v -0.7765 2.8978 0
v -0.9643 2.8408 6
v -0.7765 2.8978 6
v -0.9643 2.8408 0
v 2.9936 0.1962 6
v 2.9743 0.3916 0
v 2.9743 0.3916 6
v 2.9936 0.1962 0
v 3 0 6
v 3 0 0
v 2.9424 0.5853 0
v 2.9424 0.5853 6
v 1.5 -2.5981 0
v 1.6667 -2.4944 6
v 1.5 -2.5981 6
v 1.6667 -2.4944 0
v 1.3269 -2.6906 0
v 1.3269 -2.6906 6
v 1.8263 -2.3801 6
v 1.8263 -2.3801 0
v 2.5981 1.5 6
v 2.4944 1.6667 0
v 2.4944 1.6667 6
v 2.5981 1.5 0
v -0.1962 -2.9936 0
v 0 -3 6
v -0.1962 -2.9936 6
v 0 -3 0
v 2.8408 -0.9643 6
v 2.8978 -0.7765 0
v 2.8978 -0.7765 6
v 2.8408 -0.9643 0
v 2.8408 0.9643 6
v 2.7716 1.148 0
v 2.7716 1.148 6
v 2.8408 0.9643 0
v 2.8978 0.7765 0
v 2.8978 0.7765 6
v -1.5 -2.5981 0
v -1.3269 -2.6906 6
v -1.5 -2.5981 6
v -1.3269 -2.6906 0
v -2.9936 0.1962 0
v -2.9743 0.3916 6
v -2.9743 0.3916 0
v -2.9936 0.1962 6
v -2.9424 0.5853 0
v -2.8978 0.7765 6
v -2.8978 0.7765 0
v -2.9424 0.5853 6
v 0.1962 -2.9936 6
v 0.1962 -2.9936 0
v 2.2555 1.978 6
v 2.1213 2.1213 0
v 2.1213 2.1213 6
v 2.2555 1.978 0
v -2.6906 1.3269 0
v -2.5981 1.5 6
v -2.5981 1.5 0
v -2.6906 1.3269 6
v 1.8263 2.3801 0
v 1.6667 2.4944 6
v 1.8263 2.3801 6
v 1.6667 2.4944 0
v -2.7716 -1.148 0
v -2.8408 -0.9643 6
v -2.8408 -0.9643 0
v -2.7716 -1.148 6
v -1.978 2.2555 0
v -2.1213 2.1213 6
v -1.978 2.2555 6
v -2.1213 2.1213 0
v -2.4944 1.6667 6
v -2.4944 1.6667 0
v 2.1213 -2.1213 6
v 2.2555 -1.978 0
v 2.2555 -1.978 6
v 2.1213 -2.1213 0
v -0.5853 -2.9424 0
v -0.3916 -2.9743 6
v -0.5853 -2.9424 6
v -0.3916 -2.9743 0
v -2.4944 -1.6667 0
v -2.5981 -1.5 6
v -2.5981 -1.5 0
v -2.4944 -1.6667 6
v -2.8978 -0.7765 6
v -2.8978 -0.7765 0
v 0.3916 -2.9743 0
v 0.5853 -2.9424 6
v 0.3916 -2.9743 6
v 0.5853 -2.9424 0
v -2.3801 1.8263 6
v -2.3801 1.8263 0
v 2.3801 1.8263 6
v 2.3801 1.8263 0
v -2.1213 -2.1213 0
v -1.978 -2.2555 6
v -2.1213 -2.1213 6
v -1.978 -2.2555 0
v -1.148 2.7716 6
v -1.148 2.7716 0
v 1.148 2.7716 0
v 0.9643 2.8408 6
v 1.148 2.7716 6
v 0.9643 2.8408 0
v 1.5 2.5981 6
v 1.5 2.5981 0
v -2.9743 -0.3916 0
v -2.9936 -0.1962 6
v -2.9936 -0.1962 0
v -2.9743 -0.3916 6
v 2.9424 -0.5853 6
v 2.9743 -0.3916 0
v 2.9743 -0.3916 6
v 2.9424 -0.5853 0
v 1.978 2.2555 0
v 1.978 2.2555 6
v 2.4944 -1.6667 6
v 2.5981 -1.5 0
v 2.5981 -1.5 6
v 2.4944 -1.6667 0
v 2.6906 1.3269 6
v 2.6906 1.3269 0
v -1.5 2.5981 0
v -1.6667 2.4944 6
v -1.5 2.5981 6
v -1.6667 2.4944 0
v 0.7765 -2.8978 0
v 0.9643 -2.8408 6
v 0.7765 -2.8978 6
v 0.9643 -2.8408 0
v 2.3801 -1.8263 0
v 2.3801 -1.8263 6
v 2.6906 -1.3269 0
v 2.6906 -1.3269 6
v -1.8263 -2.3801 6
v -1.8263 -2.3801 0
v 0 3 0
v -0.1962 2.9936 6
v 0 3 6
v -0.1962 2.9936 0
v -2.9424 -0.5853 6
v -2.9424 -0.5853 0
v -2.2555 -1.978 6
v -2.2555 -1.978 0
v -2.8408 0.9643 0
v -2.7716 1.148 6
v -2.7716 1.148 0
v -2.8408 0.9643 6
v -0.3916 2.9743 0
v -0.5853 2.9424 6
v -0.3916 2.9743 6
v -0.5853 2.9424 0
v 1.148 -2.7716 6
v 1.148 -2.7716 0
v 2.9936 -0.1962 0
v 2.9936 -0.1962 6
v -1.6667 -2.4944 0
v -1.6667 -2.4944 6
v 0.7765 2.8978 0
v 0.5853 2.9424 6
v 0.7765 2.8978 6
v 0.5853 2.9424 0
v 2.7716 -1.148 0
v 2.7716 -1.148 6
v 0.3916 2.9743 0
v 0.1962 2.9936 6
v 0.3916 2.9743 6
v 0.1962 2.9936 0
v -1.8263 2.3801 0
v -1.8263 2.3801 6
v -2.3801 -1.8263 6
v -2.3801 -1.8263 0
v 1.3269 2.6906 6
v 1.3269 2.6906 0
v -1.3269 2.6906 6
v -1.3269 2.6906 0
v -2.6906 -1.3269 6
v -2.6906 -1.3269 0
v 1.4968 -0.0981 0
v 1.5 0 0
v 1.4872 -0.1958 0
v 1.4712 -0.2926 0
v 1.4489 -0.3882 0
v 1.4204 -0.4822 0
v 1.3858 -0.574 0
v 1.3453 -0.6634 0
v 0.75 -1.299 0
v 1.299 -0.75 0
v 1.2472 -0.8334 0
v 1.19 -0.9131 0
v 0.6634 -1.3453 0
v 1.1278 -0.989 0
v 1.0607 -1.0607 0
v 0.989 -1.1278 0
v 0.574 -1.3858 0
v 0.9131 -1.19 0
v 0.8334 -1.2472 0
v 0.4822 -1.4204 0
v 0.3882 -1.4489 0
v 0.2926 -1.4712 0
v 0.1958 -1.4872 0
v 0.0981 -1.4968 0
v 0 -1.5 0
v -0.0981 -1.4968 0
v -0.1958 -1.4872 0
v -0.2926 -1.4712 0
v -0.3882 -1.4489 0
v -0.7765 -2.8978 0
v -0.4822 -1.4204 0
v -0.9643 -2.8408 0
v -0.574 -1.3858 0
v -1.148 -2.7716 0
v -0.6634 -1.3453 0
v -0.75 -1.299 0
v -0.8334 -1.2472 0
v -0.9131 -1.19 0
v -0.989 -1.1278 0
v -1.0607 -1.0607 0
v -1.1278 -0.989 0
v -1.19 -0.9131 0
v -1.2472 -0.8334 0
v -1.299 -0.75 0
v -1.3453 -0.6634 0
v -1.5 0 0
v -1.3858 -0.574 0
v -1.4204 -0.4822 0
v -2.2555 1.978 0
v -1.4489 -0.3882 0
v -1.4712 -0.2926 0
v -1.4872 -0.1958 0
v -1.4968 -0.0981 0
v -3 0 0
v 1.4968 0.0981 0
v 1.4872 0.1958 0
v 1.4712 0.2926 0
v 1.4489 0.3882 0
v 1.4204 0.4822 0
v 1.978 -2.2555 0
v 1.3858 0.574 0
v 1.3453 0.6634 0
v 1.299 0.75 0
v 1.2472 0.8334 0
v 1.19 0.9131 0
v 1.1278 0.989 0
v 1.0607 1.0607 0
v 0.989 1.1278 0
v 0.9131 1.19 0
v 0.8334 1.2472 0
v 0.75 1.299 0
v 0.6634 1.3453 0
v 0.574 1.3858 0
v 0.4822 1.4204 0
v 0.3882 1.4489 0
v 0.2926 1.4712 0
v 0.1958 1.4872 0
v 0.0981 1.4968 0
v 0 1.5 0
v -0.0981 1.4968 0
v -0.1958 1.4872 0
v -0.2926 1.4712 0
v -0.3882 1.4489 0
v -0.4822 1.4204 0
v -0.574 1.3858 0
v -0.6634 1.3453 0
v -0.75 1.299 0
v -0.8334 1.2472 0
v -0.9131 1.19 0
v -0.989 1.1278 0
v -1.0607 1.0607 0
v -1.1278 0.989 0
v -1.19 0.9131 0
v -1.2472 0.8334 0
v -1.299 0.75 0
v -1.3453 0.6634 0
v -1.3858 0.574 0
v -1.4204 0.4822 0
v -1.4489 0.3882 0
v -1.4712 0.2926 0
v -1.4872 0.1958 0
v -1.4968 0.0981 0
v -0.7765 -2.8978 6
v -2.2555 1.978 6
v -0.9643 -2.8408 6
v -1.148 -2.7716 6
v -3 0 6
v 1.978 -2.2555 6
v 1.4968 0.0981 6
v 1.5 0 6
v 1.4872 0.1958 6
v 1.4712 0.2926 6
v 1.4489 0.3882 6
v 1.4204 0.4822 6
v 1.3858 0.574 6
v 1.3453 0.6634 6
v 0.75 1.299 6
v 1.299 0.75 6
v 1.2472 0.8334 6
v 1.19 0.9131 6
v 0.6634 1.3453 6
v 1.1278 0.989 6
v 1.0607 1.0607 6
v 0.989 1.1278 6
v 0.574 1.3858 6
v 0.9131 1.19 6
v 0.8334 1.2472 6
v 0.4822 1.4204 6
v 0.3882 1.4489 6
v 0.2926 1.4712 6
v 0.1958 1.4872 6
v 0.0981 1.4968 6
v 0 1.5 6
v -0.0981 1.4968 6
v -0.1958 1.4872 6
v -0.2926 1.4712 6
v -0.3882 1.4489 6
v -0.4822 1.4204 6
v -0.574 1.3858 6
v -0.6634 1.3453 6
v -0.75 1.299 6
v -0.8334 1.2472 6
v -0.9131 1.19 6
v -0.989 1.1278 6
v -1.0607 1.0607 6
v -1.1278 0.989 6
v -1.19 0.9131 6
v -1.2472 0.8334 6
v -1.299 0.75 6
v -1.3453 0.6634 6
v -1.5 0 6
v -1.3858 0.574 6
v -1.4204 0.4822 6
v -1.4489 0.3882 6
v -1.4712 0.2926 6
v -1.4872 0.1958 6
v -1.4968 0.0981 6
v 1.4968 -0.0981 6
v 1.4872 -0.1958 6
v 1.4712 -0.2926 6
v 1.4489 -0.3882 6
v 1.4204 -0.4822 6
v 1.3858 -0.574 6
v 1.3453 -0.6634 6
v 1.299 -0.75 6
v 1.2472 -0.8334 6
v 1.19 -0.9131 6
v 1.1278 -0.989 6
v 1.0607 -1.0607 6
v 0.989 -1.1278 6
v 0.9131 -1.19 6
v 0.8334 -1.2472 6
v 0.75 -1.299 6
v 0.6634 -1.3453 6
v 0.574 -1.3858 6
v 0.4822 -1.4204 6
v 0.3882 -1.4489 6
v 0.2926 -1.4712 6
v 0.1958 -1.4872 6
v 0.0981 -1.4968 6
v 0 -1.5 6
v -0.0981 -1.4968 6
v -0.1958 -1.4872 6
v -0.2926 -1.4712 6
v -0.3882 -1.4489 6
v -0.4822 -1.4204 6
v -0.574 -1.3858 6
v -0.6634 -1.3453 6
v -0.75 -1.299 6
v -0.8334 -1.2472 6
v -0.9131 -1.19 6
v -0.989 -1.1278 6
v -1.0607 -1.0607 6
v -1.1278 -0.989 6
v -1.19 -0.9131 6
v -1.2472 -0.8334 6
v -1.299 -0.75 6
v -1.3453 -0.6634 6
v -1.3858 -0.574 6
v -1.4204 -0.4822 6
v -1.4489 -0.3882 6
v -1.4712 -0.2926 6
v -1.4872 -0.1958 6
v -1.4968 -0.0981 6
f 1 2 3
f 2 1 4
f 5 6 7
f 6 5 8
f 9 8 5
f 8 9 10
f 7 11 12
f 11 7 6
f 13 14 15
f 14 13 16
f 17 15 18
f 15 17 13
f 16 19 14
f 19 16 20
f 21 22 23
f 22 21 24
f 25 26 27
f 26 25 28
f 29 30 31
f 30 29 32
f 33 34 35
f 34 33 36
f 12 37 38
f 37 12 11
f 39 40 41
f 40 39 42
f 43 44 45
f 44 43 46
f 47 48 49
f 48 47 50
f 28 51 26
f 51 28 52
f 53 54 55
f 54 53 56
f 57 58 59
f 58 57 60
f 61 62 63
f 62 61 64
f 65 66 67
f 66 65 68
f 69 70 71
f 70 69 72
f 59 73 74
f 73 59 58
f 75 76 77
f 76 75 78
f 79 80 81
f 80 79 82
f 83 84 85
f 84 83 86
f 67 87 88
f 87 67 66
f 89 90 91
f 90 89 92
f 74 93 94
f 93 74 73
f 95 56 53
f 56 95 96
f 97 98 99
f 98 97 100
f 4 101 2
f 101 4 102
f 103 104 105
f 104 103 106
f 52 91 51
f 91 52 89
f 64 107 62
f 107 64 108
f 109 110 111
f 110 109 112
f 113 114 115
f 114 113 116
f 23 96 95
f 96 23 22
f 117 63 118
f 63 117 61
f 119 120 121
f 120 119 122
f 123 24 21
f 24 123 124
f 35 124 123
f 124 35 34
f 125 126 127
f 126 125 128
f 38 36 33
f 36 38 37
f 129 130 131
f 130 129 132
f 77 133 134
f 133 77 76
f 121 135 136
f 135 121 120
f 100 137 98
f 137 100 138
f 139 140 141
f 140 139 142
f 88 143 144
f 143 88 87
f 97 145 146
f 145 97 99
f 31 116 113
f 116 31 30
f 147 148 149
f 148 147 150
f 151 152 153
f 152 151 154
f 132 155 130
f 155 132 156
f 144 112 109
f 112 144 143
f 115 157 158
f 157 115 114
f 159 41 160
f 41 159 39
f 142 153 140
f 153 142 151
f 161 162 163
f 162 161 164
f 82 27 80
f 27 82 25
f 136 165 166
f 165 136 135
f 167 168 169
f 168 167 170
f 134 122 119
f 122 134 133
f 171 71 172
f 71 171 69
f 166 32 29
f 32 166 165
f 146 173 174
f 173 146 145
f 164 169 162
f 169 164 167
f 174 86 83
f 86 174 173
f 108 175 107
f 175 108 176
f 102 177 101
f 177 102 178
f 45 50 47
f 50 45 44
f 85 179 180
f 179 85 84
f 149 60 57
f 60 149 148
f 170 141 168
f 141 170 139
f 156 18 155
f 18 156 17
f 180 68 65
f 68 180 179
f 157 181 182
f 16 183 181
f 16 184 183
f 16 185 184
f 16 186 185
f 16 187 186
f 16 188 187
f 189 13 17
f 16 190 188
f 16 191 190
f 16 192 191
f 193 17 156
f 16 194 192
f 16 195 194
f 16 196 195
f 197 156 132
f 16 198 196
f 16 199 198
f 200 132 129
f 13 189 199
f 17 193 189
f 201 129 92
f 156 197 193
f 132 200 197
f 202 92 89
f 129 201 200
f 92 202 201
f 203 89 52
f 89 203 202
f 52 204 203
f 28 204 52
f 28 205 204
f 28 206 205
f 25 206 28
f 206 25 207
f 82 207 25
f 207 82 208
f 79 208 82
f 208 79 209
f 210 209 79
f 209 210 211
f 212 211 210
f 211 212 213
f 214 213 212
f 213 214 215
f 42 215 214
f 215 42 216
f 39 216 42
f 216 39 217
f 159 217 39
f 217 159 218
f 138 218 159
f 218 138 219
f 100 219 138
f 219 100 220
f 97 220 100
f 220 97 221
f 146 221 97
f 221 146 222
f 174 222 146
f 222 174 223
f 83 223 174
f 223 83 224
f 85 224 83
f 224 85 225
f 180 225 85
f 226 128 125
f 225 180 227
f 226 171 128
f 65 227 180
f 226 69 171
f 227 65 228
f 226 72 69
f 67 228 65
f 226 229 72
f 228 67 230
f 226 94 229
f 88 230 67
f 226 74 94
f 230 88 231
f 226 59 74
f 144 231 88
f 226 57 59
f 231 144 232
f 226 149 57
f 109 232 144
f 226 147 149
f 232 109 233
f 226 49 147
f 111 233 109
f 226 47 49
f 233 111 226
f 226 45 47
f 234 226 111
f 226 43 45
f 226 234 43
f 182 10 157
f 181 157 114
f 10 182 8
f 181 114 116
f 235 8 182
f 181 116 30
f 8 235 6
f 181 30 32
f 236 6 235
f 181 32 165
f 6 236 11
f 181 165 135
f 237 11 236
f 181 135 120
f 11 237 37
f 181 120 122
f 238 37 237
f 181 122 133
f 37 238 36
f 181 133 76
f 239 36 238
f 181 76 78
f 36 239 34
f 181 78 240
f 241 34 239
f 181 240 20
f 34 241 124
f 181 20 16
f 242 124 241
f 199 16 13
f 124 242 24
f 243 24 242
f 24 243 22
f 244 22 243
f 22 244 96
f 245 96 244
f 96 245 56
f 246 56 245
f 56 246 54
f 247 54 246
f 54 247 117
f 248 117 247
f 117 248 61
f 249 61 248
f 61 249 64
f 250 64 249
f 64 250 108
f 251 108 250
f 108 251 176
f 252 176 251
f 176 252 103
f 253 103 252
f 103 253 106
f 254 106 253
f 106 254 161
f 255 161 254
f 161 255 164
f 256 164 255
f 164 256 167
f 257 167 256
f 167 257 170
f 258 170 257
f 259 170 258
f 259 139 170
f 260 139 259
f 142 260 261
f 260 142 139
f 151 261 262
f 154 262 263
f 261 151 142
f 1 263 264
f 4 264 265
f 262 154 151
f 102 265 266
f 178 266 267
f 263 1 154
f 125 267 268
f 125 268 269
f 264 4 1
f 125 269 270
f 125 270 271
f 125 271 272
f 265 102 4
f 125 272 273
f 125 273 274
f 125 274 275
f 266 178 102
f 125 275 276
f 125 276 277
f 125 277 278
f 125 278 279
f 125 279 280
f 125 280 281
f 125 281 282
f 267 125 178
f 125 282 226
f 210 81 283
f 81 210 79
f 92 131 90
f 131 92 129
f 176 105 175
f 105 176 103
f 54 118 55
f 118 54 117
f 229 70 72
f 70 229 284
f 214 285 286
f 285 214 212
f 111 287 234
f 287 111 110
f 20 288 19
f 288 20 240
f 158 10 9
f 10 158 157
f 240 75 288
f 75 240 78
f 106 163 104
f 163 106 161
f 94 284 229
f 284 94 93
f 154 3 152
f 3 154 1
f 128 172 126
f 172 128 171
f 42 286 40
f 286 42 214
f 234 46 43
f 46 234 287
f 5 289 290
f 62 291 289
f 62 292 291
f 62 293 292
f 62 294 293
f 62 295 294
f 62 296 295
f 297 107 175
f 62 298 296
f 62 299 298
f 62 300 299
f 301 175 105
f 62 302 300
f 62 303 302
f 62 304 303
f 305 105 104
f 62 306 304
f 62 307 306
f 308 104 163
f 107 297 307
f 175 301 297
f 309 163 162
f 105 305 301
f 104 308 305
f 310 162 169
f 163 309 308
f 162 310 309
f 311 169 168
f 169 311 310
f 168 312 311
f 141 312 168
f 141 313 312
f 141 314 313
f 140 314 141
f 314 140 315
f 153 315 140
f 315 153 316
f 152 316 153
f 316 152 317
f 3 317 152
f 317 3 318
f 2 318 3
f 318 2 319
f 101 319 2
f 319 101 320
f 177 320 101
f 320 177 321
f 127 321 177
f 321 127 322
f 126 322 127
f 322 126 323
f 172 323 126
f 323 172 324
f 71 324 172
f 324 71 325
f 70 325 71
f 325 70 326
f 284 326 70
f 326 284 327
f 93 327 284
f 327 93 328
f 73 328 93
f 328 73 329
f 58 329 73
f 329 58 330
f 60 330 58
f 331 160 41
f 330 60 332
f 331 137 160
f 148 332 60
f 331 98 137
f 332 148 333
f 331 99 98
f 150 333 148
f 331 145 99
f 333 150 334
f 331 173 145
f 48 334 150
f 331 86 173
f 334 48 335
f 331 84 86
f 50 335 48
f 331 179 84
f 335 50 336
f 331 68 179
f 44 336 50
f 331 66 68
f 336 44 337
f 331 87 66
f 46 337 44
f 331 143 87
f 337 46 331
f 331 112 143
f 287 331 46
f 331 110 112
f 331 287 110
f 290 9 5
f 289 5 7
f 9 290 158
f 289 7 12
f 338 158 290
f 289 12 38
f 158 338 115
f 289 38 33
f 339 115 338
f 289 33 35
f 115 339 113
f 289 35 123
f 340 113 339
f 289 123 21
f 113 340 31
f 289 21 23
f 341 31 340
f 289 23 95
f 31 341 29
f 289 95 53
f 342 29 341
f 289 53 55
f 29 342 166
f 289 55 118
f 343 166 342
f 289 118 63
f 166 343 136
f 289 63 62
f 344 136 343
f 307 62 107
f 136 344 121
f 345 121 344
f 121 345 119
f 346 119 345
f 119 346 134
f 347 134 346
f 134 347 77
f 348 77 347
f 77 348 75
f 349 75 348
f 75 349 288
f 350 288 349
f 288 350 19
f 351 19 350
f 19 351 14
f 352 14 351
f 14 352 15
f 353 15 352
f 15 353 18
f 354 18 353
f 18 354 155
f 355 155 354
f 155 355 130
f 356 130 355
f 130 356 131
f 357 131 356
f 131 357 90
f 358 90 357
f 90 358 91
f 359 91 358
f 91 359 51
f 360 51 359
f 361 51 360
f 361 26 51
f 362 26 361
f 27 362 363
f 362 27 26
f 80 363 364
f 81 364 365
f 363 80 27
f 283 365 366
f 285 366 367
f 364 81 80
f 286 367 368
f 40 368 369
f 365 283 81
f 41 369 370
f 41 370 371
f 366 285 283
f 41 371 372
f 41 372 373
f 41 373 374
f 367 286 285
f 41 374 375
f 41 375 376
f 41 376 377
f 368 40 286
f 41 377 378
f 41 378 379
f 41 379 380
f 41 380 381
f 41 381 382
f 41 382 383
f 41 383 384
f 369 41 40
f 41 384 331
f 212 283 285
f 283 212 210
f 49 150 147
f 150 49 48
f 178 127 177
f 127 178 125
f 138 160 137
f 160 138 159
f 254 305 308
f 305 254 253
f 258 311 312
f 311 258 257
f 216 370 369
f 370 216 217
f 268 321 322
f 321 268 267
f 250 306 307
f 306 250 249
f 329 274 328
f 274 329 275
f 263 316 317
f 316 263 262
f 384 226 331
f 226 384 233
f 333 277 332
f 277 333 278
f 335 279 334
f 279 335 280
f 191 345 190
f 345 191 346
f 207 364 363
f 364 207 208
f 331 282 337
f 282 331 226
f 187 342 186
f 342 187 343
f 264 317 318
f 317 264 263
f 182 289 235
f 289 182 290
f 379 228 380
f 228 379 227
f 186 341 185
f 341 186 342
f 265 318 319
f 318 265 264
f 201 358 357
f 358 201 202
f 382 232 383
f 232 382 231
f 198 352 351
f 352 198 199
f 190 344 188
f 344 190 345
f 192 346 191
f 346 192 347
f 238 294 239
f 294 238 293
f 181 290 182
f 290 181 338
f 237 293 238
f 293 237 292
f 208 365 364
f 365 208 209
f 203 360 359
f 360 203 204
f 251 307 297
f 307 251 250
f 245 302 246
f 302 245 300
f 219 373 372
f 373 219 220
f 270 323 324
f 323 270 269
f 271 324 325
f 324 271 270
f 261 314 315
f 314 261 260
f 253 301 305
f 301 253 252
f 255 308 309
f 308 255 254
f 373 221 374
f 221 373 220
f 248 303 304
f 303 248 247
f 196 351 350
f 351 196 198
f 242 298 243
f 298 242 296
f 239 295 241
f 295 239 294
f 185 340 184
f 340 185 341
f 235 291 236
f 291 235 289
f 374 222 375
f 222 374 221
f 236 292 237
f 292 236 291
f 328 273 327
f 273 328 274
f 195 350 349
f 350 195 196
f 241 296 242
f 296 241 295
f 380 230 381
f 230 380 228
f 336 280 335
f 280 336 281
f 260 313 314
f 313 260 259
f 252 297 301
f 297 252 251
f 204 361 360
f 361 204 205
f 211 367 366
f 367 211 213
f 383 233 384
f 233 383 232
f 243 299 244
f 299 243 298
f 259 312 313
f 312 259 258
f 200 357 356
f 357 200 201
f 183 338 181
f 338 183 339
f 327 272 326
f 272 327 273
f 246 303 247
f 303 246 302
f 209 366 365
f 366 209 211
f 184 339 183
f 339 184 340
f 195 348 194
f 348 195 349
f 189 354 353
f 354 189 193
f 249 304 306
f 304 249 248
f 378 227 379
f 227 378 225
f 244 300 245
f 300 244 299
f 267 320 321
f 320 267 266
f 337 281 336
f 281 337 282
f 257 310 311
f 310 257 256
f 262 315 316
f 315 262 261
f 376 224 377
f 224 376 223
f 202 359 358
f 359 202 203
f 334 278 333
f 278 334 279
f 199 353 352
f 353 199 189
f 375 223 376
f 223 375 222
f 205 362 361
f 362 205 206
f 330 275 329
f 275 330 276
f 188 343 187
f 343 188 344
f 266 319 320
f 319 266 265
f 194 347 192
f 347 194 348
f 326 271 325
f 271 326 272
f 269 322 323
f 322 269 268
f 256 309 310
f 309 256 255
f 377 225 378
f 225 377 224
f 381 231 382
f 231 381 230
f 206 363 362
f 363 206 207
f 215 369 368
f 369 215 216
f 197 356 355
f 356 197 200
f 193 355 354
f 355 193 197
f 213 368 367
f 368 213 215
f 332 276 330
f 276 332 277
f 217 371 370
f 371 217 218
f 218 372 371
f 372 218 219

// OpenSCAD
$fn = 96;

thread_d = 3.0;      // mm (nominal)
length   = 6.0;      // mm
outer_d  = 6.0;      // mm (assumed since "Nonemm diameter" likely means 6mm)

difference() {
  cylinder(d = outer_d, h = length);
  translate([0,0,-0.2])
    cylinder(d = thread_d, h = length + 0.4);
}
